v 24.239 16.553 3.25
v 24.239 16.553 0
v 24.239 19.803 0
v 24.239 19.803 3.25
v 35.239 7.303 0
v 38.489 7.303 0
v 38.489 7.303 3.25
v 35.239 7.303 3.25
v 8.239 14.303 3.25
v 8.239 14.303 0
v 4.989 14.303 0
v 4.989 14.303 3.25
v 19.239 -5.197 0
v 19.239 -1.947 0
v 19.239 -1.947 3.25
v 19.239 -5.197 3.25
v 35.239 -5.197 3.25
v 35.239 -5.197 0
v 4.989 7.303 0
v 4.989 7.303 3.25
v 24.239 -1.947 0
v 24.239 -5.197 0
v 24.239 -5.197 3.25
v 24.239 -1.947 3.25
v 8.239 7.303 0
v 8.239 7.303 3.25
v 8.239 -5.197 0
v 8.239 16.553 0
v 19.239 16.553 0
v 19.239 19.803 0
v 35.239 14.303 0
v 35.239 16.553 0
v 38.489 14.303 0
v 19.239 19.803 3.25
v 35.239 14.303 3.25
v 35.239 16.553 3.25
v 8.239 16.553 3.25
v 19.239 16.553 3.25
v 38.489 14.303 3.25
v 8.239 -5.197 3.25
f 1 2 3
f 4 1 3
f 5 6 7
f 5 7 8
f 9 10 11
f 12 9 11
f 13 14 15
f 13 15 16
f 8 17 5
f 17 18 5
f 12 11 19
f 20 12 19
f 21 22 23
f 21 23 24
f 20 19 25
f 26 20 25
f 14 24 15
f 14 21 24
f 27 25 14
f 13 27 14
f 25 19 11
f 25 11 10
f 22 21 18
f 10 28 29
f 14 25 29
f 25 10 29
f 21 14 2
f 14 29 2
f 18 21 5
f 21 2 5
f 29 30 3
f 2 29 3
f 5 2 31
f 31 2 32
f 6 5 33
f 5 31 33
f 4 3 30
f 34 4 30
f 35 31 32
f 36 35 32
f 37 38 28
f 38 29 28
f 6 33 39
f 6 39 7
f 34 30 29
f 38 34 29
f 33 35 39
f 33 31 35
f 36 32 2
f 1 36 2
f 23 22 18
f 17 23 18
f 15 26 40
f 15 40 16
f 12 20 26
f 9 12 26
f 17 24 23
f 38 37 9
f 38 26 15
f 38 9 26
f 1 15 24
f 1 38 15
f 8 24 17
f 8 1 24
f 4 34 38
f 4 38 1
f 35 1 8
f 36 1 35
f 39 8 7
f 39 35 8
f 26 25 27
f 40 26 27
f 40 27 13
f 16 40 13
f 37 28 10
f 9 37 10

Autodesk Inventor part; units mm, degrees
ref_plane "YZ Plane" through (0, 0, 0) normal (1, 0, 0) x (0, 1, 0)
ref_plane "XZ Plane" through (0, 0, 0) normal (0, 1, 0) x (-1, 0, 0)
ref_plane "XY Plane" through (0, 0, 0) normal (0, 0, 1) x (1, 0, 0)
sketch "Block1" plane through (0, 0, 0) normal (0, 0, 1) x (1, 0, 0)
  circle A0 centre (74.029, 24.2723) radius 1
  line L0 (49.279, 30.4723) -> (71.779, 30.4723)
  line L1 (71.779, 30.4723) -> (71.779, 18.0723)
  line L2 (71.779, 18.0723) -> (49.279, 18.0723)
  line L3 (49.279, 18.0723) -> (49.279, 30.4723)
  line L4 (49.279, 30.4723) -> (44.779, 30.4723)
  line L5 (44.779, 30.4723) -> (44.779, 18.0723)
  line L6 (44.779, 18.0723) -> (49.279, 18.0723)
  line L7 (49.279, 18.0723) -> (49.279, 30.4723)
  line L8 (71.779, 30.4723) -> (76.279, 30.4723)
  line L9 (76.279, 30.4723) -> (76.279, 18.0723)
  line L10 (76.279, 18.0723) -> (71.779, 18.0723)
  line L11 (71.779, 18.0723) -> (71.779, 30.4723)
  line L12 (44.779, 24.2723) -> (76.279, 24.2723) construction
  line L13 (47.029, 30.4723) -> (47.029, 18.0723) construction
  circle A1 centre (47.029, 24.2723) radius 1
  line L14 (74.029, 30.4723) -> (74.029, 18.0723) construction
  point P0 (60.979, 24.0984)
  dimension "d7" = 22.5
  dimension "d8" = 12.4
  dimension "d9" = 4.5
  dimension "d10" = 4.5
  dimension "d11" = 2
  dimension "d12" = 2
sketch "Sketch1" plane through (0, 0, 0) normal (0, 0, 1) x (1, 0, 0)
  line L0 (-92.7646, -8.503) -> (-89.7646, -8.503)
  line L1 (-89.7646, -8.503) -> (-89.7646, -11.753)
  line L2 (-89.7646, -11.753) -> (-92.7646, -11.753)
  line L3 (-92.7646, -11.753) -> (-92.7646, -8.503)
  line L4 (-92.7646, -21.6527) -> (-89.7646, -21.6527)
  line L5 (-89.7646, -21.6527) -> (-89.7646, -21.7527)
  line L6 (-89.7646, -21.7527) -> (-92.7646, -21.7527)
  line L7 (-92.7646, -21.7527) -> (-92.7646, -21.6527)
  line L8 (8.2387, -5.1967) -> (35.2387, -5.1967)
  line L9 (35.2387, -5.1967) -> (35.2387, 16.5533)
  line L10 (35.2387, 16.5533) -> (8.2387, 16.5533)
  line L11 (8.2387, 16.5533) -> (8.2387, -5.1967)
  line L12 (8.2387, 5.6783) -> (35.2387, 5.6783) construction
  line L13 (21.7387, 16.5533) -> (21.7387, -5.1967) construction
  line L14 (19.2387, 16.5533) -> (24.2387, 16.5533)
  line L15 (24.2387, 16.5533) -> (24.2387, 19.8033)
  line L16 (24.2387, 19.8033) -> (19.2387, 19.8033)
  line L17 (19.2387, 19.8033) -> (19.2387, 16.5533)
  line L18 (21.7387, 19.8033) -> (21.7387, 16.5533) construction
  line L19 (8.2387, 14.3033) -> (4.9887, 14.3033)
  line L20 (4.9887, 14.3033) -> (4.9887, 7.3033)
  line L21 (4.9887, 7.3033) -> (8.2387, 7.3033)
  line L22 (8.2387, 7.3033) -> (8.2387, 14.3033)
  line L23 (19.2387, -5.1967) -> (24.2387, -5.1967)
  line L24 (24.2387, -5.1967) -> (24.2387, -1.9467)
  line L25 (24.2387, -1.9467) -> (19.2387, -1.9467)
  line L26 (19.2387, -1.9467) -> (19.2387, -5.1967)
  line L27 (21.7387, -1.9467) -> (21.7387, -5.1967) construction
  line L28 (35.2387, 14.3033) -> (38.4887, 14.3033)
  line L29 (38.4887, 14.3033) -> (38.4887, 7.3033)
  line L30 (38.4887, 7.3033) -> (35.2387, 7.3033)
  line L31 (35.2387, 7.3033) -> (35.2387, 14.3033)
  point P0 (0, 0)
  dimension "d0" = 3
  dimension "mat" = 3.25
  dimension "d2" = 3
  dimension "d3" = 0.1
  dimension "d58" = 27
  dimension "d59" = 21.75
  dimension "d60" = 5
  dimension "d61" = 3.25
  dimension "d64" = 3.25
  dimension "d65" = 7
  dimension "d66" = 5
  dimension "d67" = 3.25
  dimension "d70" = 2.25
  dimension "d75" = 27
extrude "Extrusion5" add sketch "Sketch1" along normal blind 3.25 contours L11 L10 L9 L8 L24 L25 L26 | L26 L25 L24 L8 | L17 L16 L15 L10
extrude "Extrusion6" cut sketch "Sketch1" along normal blind 3.25 contours L26 L25 L24 L8
extrude "Extrusion7" add sketch "Sketch1" along normal blind 3.25 contours L21 L20 L19 L11
extrude "Extrusion8" add sketch "Sketch1" along normal blind 3.25 contours L9 L28 L29 L30
equation "\"d61\" = mat"
equation "\"d64\" = mat"
equation "\"d67\" = mat"
equation "\"d62\" = mat"
equation "\"d68\" = mat"
equation "\"d71\" = mat"
equation "\"d73\" = mat"
properties part number "arm-servo"
